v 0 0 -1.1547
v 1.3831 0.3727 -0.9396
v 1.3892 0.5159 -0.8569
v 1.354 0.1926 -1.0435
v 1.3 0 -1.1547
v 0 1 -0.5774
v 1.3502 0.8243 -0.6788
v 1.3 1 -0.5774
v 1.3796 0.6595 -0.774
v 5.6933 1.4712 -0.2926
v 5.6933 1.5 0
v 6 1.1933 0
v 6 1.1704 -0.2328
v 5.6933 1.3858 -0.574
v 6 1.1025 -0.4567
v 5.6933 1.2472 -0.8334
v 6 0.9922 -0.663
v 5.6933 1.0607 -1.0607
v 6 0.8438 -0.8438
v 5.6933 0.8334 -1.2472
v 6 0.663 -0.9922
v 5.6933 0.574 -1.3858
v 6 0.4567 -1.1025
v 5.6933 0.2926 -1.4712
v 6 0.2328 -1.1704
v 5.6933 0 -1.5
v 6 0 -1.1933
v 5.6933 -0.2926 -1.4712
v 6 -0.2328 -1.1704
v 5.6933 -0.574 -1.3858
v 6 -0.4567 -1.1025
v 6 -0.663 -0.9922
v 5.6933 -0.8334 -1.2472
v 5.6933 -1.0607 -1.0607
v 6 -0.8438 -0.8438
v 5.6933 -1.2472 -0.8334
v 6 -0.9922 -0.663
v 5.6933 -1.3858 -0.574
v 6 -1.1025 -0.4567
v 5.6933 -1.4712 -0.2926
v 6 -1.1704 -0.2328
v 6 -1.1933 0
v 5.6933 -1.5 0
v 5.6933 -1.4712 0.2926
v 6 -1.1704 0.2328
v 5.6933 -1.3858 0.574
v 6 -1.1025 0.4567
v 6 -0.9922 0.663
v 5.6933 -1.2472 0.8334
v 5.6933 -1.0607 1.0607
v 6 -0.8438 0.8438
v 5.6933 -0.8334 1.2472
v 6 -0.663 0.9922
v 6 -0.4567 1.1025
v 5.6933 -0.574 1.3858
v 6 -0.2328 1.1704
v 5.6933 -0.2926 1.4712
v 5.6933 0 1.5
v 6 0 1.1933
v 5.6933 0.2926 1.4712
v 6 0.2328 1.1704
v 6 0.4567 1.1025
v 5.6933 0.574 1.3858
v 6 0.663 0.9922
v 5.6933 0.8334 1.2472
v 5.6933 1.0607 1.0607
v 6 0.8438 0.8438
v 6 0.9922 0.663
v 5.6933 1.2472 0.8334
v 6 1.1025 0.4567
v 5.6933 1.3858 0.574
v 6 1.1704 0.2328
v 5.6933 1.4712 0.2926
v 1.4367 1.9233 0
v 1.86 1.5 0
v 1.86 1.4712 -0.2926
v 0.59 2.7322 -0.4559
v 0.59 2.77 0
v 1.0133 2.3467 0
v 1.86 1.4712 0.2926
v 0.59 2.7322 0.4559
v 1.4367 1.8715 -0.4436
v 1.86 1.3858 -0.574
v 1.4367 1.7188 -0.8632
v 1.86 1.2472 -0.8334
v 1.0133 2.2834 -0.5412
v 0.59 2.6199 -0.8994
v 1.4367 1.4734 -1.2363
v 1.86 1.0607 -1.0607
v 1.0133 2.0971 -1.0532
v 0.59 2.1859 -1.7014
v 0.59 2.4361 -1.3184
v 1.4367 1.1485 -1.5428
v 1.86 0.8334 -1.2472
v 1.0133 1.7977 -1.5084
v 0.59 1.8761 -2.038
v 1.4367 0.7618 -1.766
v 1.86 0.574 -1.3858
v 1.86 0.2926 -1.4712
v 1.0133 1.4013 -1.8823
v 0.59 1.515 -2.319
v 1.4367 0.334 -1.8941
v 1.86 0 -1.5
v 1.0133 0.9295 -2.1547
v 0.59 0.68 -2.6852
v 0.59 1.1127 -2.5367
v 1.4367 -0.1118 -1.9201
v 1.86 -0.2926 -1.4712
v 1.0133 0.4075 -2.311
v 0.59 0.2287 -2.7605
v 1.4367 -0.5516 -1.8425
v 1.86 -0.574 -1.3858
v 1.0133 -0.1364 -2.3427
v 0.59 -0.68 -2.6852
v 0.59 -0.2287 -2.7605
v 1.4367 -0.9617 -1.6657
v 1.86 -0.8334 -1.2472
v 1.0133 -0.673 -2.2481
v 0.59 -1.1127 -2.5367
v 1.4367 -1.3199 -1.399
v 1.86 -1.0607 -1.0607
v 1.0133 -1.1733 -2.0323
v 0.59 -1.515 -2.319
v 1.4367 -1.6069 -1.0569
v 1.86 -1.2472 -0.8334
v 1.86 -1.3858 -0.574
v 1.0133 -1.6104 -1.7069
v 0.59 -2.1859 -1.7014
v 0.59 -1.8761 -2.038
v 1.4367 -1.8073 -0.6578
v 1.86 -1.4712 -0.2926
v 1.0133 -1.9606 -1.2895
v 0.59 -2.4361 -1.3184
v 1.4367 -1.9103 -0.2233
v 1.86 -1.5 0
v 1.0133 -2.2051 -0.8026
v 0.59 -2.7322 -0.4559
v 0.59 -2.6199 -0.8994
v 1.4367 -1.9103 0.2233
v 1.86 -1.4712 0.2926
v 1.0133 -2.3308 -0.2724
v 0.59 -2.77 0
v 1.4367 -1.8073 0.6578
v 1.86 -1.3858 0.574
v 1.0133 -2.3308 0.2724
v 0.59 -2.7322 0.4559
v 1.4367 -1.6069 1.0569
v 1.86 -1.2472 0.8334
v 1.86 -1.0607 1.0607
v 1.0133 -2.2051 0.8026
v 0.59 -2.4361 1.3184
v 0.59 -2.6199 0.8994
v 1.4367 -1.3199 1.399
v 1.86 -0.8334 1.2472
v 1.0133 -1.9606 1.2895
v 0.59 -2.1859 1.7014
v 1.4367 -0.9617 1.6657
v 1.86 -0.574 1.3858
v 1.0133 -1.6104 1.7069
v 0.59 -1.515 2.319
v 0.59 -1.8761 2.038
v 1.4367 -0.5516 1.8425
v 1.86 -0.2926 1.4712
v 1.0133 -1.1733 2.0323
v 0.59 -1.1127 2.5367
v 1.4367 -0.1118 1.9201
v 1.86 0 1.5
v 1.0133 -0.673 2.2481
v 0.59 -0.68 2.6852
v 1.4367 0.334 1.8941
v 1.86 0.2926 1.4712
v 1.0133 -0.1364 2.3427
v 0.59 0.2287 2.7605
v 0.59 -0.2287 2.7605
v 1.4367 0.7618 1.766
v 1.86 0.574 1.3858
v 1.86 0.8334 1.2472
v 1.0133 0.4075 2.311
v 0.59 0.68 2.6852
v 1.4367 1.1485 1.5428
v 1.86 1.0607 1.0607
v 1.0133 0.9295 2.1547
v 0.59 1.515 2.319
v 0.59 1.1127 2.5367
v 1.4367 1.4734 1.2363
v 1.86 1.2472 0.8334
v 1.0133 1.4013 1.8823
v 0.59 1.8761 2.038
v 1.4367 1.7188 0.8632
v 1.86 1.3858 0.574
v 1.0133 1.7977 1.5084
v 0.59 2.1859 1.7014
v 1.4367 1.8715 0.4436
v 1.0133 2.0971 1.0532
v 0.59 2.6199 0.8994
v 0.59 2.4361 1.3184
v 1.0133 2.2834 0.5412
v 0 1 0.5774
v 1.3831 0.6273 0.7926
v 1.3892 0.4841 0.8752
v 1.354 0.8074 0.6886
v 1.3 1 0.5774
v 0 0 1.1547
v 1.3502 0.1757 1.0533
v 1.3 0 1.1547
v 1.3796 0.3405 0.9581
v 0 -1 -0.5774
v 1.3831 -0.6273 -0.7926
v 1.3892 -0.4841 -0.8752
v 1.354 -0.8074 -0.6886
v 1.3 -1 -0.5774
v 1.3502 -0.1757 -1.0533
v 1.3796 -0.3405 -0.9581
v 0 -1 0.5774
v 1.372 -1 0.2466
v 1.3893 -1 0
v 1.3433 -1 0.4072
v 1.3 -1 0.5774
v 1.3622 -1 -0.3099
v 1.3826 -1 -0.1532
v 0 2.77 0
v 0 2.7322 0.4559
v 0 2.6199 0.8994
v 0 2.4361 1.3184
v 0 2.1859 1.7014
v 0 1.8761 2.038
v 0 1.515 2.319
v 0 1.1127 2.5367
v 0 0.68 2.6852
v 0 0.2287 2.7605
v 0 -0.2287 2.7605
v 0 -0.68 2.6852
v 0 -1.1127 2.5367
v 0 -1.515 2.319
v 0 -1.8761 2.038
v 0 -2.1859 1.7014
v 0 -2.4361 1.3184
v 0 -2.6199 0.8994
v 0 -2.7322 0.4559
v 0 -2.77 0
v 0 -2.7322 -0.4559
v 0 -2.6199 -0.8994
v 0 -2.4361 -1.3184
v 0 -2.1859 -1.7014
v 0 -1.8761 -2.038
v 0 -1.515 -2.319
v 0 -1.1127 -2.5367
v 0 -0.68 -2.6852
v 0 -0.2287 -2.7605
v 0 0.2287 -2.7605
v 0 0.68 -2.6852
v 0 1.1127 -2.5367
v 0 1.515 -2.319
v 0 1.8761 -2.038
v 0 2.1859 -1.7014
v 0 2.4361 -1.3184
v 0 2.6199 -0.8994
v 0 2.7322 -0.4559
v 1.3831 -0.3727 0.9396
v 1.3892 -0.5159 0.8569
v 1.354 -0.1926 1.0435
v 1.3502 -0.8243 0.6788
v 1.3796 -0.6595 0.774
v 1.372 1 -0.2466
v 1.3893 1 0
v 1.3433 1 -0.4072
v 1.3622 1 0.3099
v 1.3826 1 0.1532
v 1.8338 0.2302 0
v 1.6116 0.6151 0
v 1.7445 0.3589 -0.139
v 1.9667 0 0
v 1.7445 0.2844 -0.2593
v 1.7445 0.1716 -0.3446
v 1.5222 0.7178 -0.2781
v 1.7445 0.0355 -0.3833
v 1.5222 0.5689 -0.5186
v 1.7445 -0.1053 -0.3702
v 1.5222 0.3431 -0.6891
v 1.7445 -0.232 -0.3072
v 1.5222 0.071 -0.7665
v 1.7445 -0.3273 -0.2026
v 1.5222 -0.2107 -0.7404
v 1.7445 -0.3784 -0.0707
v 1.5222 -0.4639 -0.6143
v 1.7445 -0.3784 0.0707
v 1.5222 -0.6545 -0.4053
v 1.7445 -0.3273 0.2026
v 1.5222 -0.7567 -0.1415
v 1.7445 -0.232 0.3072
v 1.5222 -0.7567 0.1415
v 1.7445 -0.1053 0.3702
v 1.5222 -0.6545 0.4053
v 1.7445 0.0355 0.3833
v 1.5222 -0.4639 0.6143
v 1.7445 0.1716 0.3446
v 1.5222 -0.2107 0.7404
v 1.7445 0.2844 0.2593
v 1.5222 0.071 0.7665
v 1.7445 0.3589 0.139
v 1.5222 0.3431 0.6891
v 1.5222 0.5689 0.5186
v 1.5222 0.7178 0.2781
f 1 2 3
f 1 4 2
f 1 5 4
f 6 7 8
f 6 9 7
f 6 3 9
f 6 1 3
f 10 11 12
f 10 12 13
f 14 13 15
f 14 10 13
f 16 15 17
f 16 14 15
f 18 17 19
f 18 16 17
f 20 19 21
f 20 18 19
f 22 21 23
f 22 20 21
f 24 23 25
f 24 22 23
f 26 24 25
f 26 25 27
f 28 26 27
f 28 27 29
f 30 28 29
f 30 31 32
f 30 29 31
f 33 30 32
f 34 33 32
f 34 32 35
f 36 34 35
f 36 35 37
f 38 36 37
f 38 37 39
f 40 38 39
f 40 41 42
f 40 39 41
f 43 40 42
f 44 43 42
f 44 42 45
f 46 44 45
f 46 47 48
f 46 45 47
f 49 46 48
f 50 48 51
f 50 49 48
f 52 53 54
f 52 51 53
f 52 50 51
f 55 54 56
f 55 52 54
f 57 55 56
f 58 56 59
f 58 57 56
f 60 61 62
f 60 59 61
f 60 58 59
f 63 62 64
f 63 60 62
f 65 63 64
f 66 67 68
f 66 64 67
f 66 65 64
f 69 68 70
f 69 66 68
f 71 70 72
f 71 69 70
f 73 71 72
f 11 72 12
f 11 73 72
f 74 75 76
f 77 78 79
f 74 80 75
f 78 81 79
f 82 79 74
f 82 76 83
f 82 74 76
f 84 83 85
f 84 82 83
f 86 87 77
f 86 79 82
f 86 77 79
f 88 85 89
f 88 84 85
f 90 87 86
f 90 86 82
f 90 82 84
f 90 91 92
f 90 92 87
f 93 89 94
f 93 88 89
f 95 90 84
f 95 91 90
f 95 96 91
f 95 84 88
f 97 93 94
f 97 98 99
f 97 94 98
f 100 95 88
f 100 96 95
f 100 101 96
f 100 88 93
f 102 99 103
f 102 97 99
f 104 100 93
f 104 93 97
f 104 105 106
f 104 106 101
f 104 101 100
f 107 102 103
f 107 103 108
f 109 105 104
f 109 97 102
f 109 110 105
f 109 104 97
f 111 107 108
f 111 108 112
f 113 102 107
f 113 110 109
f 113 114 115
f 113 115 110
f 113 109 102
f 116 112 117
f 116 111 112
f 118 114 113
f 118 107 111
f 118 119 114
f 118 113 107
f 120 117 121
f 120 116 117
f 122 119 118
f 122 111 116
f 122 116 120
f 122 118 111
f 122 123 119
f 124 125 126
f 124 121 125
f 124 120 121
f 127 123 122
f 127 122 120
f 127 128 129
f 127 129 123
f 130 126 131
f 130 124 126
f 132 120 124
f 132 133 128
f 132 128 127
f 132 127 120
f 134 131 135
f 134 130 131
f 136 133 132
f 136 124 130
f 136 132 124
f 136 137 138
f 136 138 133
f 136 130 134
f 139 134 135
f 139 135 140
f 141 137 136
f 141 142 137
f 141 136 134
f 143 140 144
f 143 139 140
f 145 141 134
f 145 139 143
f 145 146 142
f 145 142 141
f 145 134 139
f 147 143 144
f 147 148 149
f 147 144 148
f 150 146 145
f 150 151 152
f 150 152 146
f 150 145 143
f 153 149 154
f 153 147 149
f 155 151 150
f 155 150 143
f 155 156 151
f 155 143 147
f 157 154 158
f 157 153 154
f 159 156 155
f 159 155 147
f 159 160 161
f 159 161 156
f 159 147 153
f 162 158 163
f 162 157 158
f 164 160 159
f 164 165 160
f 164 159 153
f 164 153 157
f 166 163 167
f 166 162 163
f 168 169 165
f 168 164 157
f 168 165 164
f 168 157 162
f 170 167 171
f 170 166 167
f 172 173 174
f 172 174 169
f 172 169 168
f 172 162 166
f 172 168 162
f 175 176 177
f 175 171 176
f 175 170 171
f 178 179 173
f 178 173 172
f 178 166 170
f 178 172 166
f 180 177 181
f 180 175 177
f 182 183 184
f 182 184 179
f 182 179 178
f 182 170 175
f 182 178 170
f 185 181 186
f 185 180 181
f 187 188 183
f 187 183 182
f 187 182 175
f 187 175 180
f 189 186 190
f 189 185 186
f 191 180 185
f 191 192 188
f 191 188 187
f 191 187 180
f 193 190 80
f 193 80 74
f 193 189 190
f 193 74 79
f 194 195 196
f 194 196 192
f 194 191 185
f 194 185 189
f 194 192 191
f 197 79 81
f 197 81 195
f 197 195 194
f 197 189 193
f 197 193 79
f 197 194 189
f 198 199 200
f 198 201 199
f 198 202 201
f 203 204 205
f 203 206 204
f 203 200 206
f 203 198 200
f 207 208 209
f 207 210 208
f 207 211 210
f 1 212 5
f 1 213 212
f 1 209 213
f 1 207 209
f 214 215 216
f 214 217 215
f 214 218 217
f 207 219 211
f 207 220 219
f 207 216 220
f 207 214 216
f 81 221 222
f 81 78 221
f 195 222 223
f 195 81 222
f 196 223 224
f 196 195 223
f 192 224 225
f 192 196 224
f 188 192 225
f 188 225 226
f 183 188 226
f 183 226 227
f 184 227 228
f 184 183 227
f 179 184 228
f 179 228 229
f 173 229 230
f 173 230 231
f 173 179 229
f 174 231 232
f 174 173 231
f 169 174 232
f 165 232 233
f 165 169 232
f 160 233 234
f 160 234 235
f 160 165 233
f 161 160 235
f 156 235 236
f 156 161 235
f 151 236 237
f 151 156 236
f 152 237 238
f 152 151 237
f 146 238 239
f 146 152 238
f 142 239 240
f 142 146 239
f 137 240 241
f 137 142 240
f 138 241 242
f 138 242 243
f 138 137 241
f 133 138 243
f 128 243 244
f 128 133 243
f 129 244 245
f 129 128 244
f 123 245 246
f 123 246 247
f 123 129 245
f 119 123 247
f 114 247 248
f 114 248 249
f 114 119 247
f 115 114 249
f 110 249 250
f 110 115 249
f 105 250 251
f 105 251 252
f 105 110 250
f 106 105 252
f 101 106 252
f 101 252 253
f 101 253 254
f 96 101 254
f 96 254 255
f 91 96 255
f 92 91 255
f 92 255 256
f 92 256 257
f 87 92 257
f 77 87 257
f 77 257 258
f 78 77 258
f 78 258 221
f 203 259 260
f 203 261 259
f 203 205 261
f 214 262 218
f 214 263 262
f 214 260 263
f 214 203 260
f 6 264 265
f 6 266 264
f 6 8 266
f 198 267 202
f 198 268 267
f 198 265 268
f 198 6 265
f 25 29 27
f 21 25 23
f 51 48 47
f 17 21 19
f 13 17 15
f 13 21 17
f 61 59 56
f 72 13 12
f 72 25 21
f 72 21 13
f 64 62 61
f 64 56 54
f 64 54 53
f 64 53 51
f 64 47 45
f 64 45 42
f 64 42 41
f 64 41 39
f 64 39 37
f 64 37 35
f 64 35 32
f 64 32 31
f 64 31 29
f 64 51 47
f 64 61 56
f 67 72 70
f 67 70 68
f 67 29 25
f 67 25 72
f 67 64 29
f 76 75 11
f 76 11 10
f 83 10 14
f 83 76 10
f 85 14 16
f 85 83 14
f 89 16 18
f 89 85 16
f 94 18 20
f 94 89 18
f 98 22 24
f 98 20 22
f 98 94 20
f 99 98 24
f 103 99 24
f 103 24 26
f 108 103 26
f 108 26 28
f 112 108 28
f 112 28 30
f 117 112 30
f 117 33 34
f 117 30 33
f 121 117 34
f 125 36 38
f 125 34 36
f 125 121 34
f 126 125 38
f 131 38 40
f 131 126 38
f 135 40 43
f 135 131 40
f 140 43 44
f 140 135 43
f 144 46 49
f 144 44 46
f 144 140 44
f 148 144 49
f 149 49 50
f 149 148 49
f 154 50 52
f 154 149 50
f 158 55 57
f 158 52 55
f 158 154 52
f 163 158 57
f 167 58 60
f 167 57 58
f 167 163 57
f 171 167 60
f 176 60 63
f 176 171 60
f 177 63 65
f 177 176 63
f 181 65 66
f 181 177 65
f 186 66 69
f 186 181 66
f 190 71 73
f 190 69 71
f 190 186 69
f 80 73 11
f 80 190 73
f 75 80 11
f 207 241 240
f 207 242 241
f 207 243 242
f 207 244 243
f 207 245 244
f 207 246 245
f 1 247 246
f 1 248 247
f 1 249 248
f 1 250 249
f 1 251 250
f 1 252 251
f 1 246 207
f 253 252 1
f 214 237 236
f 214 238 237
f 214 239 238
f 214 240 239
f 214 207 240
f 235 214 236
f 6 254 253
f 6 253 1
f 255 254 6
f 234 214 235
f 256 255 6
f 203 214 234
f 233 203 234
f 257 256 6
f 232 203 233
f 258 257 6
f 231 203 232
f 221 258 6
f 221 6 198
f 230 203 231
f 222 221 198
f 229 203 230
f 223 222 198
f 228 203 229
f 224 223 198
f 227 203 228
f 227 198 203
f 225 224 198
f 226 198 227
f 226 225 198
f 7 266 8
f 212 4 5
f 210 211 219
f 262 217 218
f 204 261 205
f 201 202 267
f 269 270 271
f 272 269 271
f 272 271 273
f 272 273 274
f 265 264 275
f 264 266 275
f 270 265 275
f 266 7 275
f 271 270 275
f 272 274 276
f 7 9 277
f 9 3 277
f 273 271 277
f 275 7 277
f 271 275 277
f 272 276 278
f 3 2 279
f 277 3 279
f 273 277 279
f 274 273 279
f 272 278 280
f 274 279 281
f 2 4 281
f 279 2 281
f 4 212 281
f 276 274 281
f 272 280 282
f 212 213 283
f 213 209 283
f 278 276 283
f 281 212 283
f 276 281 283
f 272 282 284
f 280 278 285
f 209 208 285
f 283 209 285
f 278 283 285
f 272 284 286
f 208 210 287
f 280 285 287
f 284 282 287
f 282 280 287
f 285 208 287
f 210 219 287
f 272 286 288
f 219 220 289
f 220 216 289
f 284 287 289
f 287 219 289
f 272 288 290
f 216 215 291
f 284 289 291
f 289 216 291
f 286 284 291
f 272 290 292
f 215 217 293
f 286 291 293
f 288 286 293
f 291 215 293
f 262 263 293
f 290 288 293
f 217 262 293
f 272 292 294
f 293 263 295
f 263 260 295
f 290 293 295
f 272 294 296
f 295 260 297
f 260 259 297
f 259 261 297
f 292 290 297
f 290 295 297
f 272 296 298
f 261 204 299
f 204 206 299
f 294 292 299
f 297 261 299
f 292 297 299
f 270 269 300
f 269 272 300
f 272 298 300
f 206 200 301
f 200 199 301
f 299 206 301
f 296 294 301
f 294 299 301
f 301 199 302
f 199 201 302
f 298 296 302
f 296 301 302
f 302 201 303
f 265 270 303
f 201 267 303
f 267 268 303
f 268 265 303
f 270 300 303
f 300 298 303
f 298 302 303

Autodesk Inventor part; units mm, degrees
ref_plane "YZ Plane" through (0, 0, 0) normal (1, 0, 0) x (0, 1, 0)
ref_plane "XZ Plane" through (0, 0, 0) normal (0, 1, 0) x (-1, 0, 0)
sketch "Skizze1" plane through (0, 0, 0) normal (0, 0, 1) x (1, 0, 0)
  line L0 (6, 0) -> (6, 1.5)
  line L1 (6, 1.5) -> (2.5, 1.5)
  line L2 (2.5, 1.5) -> (2.1933, 1.5)
  line L3 (0, 2.77) -> (0, 1.1547)
  line L4 (0, 1.1547) -> (1.3, 1.1547)
  line L5 (1.3, 1.1547) -> (1.9667, 0)
  line L6 (1.9667, 0) -> (6, 0)
  line L7 (0, 2.77) -> (0.59, 2.77)
  line L8 (0.59, 2.77) -> (1.86, 1.5)
  line L9 (2.1933, 1.5) -> (1.86, 1.5)
  line L10 (2.5, 1.5) -> (1.86, 1.5) construction
  line L11 (1.86, 1.5) -> (1.86, 1.5)
  line L12 (-1.2, 0) -> (7.2, 0) projected
  line L13 (0, -0.554) -> (0, 3.324) projected
  dimension "d0" = 6
  dimension "d1" = 3.5
  dimension "d2" = 1.3
  dimension "d3" = 3
  dimension "d6" = 1.86
  dimension "d7" = 45
  dimension "d8" = 2.3094
  dimension "d9" = 60
  dimension "d10" = 5.54
  dimension "d11" = 3
  dimension "d12" = 0.3067
revolve "Körper" add sketch "Skizze1" angle 360 about axis through (1.9667, 0, 0) along (1, 0, 0) contours L6 L5 L4 L3 L7 L8 L9 L2 L1 L0
sketch "Skizze2" plane through (0, 0, 0) normal (-1, 0, 0) x (0, 0, 1)
  circle A0 centre (0, 0) radius 1.1547 projected
  line L0 (0, -3.878) -> (0, 3.878) projected
  line L1 (-3.878, 0) -> (3.878, 0) projected
  line L2 (1.1547, 0) -> (0.5774, -1)
  line L3 (0.5774, -1) -> (-0.5774, -1)
  line L4 (-0.5774, -1) -> (-1.1547, 0)
  line L5 (-1.1547, 0) -> (-0.5774, 1)
  line L6 (-0.5774, 1) -> (0.5774, 1)
  line L7 (0.5774, 1) -> (1.1547, 0)
  point P0 (0, 1.1547)
extrude "Loch" add sketch "Skizze2" against normal up to next contours L7 A0 | A0 L2 | L6 L0 A0 | A0 L0 L3 | L0 L6 A0 | A0 L3 L0 | L4 A0 | A0 L5
thread "Gewinde" size "M3x0.5" class "6g" standard "ISO Metric profile" length 4
chamfer "Fase1" distance 0.3067 distance2 0.3067 1 edges at (6, -1.5, 0) measured on face at (6, -0.3743, -0.4914)
ref_plane "Work Plane1" through (104.775, 0, 0) normal (0, 0, -1) x (1, 0, 0)
equation "\"d15\" = GEL"
equation "\"d17\" = -0.5 * SPD + 0.5 * GD"
equation "\"d18\" = GUL"
equation "\"d2\" = INTI"
equation "\"d3\" = GD"
equation "\"d6\" = KOH"
equation "\"d7\" = 0.5 * SEWI"
equation "\"d8\" = 1.1547 * SW"
equation "\"d10\" = KOD"
equation "\"d11\" = BDM"
equation "\"d12\" = GAL"
equation "\"NLG\" = 8"
equation "\"INTI\" = 1.3"
equation "\"GEL\" = 4"
equation "\"GAL\" = 0.61345 * PTC"
equation "\"KOH\" = 1.86"
equation "\"KOD\" = 5.54"
equation "\"GUL\" = 0.61345 * PTC"
equation "\"SPD\" = NND - 1.2269 * PTC"
equation "\"BDM\" = NND"
equation "\"GD\" = NND"
equation "\"SEWI\" = 90deg"
equation "\"SW\" = 2"
equation "\"TOA\" = 30deg"
equation "\"GD1\" = THREADDIA - 1.2269 * PTC"
equation "\"EPV\" = 3.36"
equation "\"THREADDIA\" = 3"
equation "\"PTC\" = 0.5"
equation "\"NND\" = 3"
equation "\"E0\" = 2.31"
equation "\"THREADDESC\" = 1.2345"
properties part number "ISO 10642 - M3 x  8" material "Stahl"
